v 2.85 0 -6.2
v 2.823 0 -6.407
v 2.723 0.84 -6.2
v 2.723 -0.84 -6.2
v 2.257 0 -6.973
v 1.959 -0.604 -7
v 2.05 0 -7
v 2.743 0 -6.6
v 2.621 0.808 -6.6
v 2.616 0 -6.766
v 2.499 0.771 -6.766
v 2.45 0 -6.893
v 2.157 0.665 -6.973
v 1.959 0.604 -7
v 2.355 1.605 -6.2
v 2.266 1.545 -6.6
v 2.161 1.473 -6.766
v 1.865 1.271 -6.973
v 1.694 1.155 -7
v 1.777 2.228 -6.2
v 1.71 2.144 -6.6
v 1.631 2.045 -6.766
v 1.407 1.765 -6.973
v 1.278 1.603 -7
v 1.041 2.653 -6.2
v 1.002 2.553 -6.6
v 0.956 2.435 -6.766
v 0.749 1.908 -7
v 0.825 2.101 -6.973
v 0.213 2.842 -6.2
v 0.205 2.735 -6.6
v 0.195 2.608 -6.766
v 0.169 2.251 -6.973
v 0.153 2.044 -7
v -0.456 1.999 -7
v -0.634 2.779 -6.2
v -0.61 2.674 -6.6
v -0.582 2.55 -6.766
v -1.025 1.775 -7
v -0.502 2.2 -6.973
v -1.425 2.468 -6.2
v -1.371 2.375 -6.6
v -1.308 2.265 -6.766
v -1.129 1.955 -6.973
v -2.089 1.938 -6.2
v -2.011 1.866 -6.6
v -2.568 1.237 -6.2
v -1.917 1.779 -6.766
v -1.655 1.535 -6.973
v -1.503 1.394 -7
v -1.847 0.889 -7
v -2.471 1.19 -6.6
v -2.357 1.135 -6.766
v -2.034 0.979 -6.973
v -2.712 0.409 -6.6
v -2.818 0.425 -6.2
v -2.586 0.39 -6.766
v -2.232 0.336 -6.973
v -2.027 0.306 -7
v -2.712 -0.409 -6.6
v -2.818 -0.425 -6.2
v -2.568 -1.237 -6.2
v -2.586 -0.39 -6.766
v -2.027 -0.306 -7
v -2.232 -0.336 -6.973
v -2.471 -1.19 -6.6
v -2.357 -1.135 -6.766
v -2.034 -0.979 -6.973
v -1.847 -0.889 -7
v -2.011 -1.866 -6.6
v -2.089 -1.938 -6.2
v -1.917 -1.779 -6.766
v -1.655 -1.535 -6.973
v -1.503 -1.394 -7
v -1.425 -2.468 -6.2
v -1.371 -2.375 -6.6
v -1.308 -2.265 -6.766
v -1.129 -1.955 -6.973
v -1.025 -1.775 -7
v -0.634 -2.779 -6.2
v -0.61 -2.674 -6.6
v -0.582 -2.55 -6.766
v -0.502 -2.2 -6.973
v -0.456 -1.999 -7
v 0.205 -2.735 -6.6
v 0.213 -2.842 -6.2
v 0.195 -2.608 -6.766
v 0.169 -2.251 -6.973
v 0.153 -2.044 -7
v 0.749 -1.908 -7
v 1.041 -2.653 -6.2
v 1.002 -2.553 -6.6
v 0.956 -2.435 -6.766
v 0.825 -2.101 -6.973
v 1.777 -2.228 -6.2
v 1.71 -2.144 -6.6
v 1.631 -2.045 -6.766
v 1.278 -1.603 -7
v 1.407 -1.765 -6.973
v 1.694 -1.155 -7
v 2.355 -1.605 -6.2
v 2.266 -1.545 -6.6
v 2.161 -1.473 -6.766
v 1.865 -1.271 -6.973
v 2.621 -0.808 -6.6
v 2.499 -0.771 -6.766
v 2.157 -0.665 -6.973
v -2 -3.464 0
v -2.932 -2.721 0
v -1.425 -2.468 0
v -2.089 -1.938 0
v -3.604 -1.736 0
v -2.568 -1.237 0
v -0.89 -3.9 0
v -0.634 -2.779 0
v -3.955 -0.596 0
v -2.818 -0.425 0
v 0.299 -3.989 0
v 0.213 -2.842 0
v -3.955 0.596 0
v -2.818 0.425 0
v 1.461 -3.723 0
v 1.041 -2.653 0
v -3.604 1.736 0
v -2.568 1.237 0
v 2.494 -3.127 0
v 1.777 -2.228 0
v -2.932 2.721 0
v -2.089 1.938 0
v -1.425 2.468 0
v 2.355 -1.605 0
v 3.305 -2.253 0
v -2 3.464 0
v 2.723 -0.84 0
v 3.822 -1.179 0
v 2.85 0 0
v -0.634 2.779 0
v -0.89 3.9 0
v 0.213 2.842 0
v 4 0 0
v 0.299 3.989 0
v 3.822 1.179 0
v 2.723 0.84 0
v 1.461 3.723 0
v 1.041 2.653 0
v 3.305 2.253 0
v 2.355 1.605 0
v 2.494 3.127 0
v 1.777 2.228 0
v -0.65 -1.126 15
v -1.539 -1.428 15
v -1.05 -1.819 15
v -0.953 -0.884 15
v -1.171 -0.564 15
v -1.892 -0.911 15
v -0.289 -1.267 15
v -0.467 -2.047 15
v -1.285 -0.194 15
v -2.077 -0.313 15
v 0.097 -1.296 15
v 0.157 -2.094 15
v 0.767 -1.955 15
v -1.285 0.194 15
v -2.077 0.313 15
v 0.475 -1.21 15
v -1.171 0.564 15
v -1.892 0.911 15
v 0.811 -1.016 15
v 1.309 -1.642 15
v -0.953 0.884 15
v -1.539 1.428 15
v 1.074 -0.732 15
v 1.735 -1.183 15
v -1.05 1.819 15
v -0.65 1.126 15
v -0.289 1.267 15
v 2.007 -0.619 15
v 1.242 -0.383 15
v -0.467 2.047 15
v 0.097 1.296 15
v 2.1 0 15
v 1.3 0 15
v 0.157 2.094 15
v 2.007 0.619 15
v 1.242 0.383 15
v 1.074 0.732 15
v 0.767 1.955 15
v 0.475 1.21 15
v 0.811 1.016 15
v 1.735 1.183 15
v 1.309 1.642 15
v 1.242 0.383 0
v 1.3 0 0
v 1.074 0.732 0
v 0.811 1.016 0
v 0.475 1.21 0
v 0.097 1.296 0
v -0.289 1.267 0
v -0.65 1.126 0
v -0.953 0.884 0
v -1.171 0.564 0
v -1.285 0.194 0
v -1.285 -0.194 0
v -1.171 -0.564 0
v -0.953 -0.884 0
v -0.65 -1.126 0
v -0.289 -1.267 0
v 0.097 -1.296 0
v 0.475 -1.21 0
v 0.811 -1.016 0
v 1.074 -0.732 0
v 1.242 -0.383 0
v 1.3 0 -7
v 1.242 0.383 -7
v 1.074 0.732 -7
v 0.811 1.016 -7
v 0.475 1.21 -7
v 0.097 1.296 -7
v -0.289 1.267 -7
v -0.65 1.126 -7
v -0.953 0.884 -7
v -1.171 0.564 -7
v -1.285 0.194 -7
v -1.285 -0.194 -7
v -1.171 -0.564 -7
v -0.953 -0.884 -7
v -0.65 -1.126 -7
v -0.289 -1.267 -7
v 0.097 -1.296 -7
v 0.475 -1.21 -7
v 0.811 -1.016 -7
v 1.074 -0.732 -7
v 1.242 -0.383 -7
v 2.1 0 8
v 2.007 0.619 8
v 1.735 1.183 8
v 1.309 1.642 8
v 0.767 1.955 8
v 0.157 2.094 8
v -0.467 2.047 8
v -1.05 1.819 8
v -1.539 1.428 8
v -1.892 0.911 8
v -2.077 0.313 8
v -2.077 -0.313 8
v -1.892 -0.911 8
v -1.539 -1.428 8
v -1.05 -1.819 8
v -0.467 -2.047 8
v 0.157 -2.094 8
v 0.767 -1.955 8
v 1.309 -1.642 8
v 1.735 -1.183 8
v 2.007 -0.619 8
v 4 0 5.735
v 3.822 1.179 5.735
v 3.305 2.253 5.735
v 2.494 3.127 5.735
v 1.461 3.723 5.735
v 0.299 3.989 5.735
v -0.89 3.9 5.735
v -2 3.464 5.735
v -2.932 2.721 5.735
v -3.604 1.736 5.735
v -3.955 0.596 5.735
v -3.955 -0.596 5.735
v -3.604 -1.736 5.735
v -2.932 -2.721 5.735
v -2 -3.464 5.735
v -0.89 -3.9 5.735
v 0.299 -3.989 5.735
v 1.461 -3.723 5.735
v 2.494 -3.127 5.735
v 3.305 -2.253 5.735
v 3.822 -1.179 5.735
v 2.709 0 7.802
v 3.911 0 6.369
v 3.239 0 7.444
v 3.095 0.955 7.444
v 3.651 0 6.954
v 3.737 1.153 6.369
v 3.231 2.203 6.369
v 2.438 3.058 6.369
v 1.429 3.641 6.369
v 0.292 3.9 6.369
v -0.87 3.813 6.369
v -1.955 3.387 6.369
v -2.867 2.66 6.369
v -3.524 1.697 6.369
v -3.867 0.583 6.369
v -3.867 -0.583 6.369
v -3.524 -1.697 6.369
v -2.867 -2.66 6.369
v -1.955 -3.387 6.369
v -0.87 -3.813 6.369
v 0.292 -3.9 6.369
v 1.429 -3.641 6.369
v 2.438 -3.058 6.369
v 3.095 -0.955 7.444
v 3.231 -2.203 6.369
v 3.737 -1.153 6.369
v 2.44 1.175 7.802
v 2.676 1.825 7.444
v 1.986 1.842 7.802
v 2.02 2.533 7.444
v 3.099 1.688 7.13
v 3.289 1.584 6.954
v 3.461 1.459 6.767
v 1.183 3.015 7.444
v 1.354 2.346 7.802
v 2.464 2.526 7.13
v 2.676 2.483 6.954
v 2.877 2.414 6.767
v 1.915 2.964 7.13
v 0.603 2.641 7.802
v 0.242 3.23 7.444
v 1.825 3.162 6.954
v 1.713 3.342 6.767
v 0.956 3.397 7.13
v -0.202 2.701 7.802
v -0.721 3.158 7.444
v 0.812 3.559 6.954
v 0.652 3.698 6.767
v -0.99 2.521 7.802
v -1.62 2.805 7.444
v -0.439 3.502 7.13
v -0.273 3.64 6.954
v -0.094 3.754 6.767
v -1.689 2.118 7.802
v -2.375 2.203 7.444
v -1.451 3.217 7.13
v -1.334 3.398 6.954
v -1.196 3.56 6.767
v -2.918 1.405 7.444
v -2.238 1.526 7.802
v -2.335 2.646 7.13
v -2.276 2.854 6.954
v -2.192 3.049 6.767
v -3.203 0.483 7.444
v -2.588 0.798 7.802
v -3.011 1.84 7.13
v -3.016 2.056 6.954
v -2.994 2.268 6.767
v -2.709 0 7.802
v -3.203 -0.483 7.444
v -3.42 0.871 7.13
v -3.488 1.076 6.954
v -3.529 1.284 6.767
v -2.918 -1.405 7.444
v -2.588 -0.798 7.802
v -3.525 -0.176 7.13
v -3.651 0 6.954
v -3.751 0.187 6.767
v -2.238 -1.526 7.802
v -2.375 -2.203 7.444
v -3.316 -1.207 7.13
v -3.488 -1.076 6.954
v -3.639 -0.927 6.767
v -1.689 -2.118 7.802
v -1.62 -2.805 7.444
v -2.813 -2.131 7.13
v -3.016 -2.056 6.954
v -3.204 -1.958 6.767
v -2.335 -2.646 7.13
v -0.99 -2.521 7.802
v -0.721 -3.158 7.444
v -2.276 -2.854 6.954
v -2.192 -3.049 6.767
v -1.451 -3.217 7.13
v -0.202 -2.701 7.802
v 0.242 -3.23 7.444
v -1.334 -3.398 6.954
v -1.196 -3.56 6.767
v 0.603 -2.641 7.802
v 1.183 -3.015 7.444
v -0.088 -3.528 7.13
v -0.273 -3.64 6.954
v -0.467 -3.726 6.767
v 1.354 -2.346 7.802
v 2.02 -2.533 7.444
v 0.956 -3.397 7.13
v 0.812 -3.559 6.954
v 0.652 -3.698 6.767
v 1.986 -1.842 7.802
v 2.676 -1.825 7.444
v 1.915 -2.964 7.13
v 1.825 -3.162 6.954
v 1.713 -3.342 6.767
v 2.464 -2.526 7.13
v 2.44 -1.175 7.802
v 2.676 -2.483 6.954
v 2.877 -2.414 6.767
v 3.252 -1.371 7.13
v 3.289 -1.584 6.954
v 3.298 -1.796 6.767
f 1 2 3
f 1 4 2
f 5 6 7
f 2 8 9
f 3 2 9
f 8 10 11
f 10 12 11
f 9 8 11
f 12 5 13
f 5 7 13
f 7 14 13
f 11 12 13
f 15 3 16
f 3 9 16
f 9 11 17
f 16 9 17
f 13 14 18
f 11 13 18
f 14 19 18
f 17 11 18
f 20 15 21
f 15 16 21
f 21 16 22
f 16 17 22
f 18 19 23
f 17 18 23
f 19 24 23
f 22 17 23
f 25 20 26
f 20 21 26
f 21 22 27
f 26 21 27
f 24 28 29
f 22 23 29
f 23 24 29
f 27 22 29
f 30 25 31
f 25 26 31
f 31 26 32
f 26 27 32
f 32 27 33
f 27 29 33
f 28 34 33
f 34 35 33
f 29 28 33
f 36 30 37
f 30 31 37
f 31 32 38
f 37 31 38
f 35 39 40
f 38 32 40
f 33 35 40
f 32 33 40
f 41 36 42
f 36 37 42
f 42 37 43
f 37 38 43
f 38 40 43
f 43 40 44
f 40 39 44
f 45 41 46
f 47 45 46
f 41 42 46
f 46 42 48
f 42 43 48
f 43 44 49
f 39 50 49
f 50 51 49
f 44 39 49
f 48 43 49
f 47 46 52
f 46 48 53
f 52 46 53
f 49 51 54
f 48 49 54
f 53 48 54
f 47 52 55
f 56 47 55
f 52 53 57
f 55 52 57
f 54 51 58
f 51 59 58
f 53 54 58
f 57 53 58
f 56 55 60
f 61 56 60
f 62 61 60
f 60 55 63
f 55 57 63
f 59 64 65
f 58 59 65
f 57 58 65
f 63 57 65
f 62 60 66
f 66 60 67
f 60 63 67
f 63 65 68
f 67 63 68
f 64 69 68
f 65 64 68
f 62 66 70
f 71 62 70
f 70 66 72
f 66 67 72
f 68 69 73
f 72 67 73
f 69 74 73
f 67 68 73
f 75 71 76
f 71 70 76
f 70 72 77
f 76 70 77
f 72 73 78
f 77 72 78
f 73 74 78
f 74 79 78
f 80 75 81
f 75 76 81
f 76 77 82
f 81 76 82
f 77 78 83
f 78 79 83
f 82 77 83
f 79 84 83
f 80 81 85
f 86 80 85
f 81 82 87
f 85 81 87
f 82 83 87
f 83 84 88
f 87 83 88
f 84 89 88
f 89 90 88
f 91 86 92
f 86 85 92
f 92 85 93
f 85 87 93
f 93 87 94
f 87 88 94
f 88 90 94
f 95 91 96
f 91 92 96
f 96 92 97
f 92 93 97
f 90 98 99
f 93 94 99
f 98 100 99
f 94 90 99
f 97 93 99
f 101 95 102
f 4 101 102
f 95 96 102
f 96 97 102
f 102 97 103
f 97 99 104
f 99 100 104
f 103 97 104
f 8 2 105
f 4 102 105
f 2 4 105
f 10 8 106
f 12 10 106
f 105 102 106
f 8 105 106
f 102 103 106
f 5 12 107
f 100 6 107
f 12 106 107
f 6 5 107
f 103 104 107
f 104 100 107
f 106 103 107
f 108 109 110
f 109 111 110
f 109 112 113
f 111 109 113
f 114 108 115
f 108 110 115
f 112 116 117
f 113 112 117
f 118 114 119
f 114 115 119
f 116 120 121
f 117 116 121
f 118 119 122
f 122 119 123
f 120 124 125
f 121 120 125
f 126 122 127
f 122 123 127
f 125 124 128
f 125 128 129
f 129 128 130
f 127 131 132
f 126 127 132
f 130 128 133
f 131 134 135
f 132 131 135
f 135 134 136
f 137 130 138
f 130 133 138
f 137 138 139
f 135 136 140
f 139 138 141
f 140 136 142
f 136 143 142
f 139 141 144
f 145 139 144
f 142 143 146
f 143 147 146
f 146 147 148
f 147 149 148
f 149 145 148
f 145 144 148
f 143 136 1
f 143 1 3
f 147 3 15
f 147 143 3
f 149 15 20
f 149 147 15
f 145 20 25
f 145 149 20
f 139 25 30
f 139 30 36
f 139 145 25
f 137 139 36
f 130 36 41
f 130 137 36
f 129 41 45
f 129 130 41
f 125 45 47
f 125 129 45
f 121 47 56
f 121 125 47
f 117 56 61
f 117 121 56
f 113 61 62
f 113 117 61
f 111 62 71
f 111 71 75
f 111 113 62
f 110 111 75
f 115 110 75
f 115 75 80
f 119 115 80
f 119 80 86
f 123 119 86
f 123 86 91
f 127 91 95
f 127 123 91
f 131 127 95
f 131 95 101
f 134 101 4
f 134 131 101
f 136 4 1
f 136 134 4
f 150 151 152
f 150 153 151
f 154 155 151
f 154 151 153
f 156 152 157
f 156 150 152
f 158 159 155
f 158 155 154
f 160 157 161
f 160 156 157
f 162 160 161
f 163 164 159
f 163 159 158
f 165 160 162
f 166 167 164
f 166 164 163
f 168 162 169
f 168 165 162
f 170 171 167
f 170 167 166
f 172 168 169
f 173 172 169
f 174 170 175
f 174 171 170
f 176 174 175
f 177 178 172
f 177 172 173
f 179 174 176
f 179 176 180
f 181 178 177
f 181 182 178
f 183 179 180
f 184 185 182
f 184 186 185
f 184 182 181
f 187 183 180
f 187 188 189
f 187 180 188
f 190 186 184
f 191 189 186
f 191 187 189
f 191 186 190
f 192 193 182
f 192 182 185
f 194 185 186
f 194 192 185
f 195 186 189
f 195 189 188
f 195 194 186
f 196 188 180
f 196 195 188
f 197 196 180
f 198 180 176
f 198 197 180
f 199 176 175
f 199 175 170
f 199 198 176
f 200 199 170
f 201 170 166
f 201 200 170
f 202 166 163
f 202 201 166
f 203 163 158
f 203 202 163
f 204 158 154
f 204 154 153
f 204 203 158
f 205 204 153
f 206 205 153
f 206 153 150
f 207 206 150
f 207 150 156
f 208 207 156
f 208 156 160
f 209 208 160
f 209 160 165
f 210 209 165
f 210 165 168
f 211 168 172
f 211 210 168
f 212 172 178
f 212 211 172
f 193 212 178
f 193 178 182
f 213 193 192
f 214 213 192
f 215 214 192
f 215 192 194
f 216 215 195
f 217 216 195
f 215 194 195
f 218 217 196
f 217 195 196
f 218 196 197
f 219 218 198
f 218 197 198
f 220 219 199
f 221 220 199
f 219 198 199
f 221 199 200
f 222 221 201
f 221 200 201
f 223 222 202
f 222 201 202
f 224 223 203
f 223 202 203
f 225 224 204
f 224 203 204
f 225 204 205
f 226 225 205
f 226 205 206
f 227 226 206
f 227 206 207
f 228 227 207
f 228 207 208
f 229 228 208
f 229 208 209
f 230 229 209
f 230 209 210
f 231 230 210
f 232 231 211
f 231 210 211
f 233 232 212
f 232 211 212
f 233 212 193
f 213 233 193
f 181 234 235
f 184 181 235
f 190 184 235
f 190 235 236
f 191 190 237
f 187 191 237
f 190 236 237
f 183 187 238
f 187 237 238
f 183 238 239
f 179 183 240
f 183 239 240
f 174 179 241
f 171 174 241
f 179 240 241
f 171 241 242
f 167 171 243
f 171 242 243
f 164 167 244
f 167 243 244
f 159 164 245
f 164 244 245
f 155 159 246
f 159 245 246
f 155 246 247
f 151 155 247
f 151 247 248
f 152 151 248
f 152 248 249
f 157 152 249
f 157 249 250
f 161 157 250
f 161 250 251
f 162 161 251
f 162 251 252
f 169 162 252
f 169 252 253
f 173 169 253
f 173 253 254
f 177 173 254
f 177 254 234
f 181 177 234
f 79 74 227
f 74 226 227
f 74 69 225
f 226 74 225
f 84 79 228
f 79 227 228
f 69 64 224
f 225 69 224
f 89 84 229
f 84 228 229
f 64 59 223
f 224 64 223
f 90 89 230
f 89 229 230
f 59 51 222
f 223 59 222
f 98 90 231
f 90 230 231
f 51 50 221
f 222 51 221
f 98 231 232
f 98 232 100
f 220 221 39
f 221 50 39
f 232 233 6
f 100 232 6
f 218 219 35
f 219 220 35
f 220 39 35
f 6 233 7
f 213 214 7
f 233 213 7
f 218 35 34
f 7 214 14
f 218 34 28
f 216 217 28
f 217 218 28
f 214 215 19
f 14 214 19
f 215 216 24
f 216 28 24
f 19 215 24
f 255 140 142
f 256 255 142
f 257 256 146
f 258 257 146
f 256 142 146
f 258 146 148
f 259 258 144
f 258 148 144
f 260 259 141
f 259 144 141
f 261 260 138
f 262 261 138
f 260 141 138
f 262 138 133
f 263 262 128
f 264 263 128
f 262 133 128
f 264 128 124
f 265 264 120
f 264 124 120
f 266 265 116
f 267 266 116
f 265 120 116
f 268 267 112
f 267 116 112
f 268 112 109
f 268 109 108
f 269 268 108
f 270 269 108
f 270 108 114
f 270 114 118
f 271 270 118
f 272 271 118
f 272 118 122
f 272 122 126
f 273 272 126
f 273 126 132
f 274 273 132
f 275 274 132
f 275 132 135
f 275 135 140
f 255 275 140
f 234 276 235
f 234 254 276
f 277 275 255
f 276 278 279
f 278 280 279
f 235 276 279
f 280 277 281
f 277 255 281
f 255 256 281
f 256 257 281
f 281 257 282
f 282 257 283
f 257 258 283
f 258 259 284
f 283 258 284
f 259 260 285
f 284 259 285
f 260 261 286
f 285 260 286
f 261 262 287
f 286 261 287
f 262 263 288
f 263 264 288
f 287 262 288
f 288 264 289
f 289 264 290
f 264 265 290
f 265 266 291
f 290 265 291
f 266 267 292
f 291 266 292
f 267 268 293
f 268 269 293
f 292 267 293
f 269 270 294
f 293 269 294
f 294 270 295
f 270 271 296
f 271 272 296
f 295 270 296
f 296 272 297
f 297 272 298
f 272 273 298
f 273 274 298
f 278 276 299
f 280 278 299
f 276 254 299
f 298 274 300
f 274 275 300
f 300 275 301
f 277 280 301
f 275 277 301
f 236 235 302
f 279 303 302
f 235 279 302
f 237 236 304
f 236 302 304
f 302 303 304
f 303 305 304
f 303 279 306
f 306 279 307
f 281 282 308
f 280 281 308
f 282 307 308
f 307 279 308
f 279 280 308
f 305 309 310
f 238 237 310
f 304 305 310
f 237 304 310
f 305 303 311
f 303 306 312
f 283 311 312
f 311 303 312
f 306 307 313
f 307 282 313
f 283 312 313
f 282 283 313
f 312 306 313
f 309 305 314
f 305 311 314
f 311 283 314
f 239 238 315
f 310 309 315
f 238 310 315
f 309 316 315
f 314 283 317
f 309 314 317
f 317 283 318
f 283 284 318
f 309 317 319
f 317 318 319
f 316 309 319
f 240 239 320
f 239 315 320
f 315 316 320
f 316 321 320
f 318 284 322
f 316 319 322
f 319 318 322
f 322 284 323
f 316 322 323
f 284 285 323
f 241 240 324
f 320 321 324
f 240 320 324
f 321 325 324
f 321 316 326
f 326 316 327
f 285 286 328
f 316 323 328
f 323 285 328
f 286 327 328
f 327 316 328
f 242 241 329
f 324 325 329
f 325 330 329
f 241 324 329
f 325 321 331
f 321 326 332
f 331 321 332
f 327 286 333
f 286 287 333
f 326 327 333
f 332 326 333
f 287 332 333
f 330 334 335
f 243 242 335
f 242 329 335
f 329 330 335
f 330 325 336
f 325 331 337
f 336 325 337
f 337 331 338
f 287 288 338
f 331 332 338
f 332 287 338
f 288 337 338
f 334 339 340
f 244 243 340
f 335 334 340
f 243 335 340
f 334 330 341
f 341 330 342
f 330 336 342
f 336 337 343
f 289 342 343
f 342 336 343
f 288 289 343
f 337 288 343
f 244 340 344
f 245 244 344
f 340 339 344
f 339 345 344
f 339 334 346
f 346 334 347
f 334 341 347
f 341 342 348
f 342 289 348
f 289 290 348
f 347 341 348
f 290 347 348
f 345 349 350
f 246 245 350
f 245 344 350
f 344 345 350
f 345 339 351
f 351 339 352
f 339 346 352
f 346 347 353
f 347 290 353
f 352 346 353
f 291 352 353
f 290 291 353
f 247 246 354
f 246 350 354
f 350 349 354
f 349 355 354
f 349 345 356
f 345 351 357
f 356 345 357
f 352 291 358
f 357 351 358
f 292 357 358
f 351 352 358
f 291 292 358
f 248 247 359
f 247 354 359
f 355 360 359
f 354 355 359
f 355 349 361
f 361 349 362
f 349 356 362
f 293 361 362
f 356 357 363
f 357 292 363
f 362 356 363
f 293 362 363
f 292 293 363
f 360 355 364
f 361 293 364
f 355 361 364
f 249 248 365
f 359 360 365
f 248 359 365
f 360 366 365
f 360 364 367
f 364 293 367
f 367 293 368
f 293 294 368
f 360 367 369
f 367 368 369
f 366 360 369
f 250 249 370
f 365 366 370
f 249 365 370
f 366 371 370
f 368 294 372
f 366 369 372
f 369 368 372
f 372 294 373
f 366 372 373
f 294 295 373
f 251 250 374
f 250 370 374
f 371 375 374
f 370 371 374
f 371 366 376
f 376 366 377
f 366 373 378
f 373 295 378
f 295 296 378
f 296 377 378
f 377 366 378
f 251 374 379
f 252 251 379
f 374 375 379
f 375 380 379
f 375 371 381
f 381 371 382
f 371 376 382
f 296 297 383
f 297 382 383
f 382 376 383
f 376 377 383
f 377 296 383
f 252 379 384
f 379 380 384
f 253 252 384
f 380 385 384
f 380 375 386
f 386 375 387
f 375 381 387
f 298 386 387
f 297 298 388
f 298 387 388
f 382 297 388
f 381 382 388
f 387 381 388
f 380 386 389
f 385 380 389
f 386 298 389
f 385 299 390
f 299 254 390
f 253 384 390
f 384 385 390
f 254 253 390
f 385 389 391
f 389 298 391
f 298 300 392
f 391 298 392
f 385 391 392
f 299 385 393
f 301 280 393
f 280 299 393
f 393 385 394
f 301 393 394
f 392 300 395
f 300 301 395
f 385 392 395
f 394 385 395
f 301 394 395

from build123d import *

# Parameters (mm, degrees)
F0_R     = 2.1
F0_R_2   = 1.3
F1_DEPTH = 15
F0_R_3   = 2.85
F2_DEPTH = 7
F0_R_4   = 4
F3_DEPTH = 8
F5_R     = 0.8


# Not quite as in the source:
# - a fillet or chamfer that OpenCascade refuses, or shapes differently, is made with other operations: its cross-section is extruded or revolved along the edge and cut away or added


with BuildPart() as f1:
    # F0 (on Top) → F1 (new body)
    with BuildSketch(Plane.XY):
        Circle(F0_R)
        Circle(F0_R_2, mode=Mode.SUBTRACT)
    extrude(amount=F1_DEPTH)

    # F0 (on Top) → F2 (join)
    with BuildSketch(Plane.XY):
        Circle(F0_R_3)
        Circle(F0_R, mode=Mode.SUBTRACT)
        Circle(F0_R)
        Circle(F0_R_2, mode=Mode.SUBTRACT)
    extrude(amount=-F2_DEPTH)

    # F0 (on Top) → F3 (join)
    with BuildSketch(Plane.XY):
        Circle(F0_R_4)
        Circle(F0_R_3, mode=Mode.SUBTRACT)
        Circle(F0_R_3)
        Circle(F0_R, mode=Mode.SUBTRACT)
    extrude(amount=F3_DEPTH)

    # F4: fillet of radius 2.3 on 1 edges, made by hand

    # F4_s1 → F4_t2 (revolve, cut)
    with BuildSketch(Plane.XZ):
        with BuildLine():
            ThreePointArc((2.1, 8), (3.4621010187, 7.2132242193), (4, 5.7350496694))
            Line((4, 5.7350496694), (4, 8))
            Line((4, 8), (2.1, 8))
        make_face()
    revolve(axis=Axis((0, 0, 8), (0, 0, 1)), mode=Mode.SUBTRACT)

    # F5
    f5_edges = [f1.edges().sort_by_distance(p)[0] for p in [
        (-2.85, 0, -7),
    ]]
    fillet(f5_edges, radius=F5_R)


solid = f1.part
